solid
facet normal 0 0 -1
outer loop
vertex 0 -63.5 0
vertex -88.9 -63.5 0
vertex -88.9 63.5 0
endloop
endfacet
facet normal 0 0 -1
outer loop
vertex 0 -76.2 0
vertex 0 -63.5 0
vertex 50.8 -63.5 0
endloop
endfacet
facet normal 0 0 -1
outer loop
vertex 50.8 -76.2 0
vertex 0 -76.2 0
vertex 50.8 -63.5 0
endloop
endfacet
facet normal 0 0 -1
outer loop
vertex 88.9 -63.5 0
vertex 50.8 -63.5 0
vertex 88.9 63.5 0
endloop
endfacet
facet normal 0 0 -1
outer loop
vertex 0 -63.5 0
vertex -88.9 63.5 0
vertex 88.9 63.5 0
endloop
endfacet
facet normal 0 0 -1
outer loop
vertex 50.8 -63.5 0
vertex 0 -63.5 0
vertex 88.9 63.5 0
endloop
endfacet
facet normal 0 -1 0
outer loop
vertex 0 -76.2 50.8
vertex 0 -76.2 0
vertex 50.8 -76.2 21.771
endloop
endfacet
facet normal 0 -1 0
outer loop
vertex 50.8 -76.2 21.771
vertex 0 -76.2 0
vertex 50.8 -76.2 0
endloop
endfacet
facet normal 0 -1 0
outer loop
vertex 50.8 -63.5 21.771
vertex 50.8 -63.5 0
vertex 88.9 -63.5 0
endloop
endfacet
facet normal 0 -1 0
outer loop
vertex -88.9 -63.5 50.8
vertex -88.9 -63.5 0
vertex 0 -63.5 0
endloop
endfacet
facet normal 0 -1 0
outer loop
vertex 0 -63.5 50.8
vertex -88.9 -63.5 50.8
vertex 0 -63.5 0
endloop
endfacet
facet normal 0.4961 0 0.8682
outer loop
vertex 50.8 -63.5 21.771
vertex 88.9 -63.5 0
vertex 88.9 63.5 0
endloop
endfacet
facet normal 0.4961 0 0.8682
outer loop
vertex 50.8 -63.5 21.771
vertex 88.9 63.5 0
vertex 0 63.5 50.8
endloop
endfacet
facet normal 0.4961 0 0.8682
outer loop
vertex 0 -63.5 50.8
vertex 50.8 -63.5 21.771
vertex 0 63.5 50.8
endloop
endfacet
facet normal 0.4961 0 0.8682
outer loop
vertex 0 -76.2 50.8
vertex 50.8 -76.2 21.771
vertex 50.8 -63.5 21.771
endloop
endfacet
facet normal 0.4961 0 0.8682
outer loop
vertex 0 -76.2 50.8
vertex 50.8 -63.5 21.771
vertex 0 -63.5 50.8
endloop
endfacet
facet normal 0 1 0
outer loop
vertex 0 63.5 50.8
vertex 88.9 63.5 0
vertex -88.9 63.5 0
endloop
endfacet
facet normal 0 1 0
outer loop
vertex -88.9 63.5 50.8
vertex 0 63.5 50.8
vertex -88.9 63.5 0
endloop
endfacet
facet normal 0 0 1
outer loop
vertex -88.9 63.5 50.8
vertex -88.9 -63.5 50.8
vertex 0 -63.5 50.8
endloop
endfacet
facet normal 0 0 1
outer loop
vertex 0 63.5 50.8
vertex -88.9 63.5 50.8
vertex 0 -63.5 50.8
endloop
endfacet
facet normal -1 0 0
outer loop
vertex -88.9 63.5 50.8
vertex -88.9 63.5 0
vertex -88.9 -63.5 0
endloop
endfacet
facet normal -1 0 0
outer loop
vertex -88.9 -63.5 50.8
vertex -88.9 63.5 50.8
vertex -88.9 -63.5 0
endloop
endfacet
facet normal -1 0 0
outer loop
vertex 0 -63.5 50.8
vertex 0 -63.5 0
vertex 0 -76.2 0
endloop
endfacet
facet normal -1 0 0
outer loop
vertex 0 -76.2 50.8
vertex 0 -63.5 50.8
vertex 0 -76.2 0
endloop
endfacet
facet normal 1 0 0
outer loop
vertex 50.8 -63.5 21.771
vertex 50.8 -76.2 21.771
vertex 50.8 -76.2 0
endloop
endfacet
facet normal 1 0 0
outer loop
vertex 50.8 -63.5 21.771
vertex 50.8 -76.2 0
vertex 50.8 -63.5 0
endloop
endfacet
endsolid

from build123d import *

# Parameters (mm, degrees)
F2_DEPTH = 50.8
F3_START = 76.201
F3_DEPTH = 139.702


with BuildPart() as f2:
    # F0 (on Top) → F2 (new body)
    with BuildSketch(Plane.XY):
        Polygon((50.8, -63.5), (88.9, -63.5), (88.9, 63.5), (-88.9, 63.5), (-88.9, -63.5), (0, -63.5), (0, -76.2), (50.8, -76.2), align=None)
    extrude(amount=F2_DEPTH)

    # F1 (on Front) → F3 (intersect)
    with BuildSketch(Plane.XZ.offset(F3_START)):
        Polygon((-88.9, 50.8), (-88.9, 0), (50.8, 0), (50.8, 21.7714285714), (0, 50.8), align=None)
        Polygon((50.8, 21.7714285714), (50.8, 0), (88.9, 0), align=None)
    extrude(amount=-F3_DEPTH, mode=Mode.INTERSECT)


solid = f2.part
